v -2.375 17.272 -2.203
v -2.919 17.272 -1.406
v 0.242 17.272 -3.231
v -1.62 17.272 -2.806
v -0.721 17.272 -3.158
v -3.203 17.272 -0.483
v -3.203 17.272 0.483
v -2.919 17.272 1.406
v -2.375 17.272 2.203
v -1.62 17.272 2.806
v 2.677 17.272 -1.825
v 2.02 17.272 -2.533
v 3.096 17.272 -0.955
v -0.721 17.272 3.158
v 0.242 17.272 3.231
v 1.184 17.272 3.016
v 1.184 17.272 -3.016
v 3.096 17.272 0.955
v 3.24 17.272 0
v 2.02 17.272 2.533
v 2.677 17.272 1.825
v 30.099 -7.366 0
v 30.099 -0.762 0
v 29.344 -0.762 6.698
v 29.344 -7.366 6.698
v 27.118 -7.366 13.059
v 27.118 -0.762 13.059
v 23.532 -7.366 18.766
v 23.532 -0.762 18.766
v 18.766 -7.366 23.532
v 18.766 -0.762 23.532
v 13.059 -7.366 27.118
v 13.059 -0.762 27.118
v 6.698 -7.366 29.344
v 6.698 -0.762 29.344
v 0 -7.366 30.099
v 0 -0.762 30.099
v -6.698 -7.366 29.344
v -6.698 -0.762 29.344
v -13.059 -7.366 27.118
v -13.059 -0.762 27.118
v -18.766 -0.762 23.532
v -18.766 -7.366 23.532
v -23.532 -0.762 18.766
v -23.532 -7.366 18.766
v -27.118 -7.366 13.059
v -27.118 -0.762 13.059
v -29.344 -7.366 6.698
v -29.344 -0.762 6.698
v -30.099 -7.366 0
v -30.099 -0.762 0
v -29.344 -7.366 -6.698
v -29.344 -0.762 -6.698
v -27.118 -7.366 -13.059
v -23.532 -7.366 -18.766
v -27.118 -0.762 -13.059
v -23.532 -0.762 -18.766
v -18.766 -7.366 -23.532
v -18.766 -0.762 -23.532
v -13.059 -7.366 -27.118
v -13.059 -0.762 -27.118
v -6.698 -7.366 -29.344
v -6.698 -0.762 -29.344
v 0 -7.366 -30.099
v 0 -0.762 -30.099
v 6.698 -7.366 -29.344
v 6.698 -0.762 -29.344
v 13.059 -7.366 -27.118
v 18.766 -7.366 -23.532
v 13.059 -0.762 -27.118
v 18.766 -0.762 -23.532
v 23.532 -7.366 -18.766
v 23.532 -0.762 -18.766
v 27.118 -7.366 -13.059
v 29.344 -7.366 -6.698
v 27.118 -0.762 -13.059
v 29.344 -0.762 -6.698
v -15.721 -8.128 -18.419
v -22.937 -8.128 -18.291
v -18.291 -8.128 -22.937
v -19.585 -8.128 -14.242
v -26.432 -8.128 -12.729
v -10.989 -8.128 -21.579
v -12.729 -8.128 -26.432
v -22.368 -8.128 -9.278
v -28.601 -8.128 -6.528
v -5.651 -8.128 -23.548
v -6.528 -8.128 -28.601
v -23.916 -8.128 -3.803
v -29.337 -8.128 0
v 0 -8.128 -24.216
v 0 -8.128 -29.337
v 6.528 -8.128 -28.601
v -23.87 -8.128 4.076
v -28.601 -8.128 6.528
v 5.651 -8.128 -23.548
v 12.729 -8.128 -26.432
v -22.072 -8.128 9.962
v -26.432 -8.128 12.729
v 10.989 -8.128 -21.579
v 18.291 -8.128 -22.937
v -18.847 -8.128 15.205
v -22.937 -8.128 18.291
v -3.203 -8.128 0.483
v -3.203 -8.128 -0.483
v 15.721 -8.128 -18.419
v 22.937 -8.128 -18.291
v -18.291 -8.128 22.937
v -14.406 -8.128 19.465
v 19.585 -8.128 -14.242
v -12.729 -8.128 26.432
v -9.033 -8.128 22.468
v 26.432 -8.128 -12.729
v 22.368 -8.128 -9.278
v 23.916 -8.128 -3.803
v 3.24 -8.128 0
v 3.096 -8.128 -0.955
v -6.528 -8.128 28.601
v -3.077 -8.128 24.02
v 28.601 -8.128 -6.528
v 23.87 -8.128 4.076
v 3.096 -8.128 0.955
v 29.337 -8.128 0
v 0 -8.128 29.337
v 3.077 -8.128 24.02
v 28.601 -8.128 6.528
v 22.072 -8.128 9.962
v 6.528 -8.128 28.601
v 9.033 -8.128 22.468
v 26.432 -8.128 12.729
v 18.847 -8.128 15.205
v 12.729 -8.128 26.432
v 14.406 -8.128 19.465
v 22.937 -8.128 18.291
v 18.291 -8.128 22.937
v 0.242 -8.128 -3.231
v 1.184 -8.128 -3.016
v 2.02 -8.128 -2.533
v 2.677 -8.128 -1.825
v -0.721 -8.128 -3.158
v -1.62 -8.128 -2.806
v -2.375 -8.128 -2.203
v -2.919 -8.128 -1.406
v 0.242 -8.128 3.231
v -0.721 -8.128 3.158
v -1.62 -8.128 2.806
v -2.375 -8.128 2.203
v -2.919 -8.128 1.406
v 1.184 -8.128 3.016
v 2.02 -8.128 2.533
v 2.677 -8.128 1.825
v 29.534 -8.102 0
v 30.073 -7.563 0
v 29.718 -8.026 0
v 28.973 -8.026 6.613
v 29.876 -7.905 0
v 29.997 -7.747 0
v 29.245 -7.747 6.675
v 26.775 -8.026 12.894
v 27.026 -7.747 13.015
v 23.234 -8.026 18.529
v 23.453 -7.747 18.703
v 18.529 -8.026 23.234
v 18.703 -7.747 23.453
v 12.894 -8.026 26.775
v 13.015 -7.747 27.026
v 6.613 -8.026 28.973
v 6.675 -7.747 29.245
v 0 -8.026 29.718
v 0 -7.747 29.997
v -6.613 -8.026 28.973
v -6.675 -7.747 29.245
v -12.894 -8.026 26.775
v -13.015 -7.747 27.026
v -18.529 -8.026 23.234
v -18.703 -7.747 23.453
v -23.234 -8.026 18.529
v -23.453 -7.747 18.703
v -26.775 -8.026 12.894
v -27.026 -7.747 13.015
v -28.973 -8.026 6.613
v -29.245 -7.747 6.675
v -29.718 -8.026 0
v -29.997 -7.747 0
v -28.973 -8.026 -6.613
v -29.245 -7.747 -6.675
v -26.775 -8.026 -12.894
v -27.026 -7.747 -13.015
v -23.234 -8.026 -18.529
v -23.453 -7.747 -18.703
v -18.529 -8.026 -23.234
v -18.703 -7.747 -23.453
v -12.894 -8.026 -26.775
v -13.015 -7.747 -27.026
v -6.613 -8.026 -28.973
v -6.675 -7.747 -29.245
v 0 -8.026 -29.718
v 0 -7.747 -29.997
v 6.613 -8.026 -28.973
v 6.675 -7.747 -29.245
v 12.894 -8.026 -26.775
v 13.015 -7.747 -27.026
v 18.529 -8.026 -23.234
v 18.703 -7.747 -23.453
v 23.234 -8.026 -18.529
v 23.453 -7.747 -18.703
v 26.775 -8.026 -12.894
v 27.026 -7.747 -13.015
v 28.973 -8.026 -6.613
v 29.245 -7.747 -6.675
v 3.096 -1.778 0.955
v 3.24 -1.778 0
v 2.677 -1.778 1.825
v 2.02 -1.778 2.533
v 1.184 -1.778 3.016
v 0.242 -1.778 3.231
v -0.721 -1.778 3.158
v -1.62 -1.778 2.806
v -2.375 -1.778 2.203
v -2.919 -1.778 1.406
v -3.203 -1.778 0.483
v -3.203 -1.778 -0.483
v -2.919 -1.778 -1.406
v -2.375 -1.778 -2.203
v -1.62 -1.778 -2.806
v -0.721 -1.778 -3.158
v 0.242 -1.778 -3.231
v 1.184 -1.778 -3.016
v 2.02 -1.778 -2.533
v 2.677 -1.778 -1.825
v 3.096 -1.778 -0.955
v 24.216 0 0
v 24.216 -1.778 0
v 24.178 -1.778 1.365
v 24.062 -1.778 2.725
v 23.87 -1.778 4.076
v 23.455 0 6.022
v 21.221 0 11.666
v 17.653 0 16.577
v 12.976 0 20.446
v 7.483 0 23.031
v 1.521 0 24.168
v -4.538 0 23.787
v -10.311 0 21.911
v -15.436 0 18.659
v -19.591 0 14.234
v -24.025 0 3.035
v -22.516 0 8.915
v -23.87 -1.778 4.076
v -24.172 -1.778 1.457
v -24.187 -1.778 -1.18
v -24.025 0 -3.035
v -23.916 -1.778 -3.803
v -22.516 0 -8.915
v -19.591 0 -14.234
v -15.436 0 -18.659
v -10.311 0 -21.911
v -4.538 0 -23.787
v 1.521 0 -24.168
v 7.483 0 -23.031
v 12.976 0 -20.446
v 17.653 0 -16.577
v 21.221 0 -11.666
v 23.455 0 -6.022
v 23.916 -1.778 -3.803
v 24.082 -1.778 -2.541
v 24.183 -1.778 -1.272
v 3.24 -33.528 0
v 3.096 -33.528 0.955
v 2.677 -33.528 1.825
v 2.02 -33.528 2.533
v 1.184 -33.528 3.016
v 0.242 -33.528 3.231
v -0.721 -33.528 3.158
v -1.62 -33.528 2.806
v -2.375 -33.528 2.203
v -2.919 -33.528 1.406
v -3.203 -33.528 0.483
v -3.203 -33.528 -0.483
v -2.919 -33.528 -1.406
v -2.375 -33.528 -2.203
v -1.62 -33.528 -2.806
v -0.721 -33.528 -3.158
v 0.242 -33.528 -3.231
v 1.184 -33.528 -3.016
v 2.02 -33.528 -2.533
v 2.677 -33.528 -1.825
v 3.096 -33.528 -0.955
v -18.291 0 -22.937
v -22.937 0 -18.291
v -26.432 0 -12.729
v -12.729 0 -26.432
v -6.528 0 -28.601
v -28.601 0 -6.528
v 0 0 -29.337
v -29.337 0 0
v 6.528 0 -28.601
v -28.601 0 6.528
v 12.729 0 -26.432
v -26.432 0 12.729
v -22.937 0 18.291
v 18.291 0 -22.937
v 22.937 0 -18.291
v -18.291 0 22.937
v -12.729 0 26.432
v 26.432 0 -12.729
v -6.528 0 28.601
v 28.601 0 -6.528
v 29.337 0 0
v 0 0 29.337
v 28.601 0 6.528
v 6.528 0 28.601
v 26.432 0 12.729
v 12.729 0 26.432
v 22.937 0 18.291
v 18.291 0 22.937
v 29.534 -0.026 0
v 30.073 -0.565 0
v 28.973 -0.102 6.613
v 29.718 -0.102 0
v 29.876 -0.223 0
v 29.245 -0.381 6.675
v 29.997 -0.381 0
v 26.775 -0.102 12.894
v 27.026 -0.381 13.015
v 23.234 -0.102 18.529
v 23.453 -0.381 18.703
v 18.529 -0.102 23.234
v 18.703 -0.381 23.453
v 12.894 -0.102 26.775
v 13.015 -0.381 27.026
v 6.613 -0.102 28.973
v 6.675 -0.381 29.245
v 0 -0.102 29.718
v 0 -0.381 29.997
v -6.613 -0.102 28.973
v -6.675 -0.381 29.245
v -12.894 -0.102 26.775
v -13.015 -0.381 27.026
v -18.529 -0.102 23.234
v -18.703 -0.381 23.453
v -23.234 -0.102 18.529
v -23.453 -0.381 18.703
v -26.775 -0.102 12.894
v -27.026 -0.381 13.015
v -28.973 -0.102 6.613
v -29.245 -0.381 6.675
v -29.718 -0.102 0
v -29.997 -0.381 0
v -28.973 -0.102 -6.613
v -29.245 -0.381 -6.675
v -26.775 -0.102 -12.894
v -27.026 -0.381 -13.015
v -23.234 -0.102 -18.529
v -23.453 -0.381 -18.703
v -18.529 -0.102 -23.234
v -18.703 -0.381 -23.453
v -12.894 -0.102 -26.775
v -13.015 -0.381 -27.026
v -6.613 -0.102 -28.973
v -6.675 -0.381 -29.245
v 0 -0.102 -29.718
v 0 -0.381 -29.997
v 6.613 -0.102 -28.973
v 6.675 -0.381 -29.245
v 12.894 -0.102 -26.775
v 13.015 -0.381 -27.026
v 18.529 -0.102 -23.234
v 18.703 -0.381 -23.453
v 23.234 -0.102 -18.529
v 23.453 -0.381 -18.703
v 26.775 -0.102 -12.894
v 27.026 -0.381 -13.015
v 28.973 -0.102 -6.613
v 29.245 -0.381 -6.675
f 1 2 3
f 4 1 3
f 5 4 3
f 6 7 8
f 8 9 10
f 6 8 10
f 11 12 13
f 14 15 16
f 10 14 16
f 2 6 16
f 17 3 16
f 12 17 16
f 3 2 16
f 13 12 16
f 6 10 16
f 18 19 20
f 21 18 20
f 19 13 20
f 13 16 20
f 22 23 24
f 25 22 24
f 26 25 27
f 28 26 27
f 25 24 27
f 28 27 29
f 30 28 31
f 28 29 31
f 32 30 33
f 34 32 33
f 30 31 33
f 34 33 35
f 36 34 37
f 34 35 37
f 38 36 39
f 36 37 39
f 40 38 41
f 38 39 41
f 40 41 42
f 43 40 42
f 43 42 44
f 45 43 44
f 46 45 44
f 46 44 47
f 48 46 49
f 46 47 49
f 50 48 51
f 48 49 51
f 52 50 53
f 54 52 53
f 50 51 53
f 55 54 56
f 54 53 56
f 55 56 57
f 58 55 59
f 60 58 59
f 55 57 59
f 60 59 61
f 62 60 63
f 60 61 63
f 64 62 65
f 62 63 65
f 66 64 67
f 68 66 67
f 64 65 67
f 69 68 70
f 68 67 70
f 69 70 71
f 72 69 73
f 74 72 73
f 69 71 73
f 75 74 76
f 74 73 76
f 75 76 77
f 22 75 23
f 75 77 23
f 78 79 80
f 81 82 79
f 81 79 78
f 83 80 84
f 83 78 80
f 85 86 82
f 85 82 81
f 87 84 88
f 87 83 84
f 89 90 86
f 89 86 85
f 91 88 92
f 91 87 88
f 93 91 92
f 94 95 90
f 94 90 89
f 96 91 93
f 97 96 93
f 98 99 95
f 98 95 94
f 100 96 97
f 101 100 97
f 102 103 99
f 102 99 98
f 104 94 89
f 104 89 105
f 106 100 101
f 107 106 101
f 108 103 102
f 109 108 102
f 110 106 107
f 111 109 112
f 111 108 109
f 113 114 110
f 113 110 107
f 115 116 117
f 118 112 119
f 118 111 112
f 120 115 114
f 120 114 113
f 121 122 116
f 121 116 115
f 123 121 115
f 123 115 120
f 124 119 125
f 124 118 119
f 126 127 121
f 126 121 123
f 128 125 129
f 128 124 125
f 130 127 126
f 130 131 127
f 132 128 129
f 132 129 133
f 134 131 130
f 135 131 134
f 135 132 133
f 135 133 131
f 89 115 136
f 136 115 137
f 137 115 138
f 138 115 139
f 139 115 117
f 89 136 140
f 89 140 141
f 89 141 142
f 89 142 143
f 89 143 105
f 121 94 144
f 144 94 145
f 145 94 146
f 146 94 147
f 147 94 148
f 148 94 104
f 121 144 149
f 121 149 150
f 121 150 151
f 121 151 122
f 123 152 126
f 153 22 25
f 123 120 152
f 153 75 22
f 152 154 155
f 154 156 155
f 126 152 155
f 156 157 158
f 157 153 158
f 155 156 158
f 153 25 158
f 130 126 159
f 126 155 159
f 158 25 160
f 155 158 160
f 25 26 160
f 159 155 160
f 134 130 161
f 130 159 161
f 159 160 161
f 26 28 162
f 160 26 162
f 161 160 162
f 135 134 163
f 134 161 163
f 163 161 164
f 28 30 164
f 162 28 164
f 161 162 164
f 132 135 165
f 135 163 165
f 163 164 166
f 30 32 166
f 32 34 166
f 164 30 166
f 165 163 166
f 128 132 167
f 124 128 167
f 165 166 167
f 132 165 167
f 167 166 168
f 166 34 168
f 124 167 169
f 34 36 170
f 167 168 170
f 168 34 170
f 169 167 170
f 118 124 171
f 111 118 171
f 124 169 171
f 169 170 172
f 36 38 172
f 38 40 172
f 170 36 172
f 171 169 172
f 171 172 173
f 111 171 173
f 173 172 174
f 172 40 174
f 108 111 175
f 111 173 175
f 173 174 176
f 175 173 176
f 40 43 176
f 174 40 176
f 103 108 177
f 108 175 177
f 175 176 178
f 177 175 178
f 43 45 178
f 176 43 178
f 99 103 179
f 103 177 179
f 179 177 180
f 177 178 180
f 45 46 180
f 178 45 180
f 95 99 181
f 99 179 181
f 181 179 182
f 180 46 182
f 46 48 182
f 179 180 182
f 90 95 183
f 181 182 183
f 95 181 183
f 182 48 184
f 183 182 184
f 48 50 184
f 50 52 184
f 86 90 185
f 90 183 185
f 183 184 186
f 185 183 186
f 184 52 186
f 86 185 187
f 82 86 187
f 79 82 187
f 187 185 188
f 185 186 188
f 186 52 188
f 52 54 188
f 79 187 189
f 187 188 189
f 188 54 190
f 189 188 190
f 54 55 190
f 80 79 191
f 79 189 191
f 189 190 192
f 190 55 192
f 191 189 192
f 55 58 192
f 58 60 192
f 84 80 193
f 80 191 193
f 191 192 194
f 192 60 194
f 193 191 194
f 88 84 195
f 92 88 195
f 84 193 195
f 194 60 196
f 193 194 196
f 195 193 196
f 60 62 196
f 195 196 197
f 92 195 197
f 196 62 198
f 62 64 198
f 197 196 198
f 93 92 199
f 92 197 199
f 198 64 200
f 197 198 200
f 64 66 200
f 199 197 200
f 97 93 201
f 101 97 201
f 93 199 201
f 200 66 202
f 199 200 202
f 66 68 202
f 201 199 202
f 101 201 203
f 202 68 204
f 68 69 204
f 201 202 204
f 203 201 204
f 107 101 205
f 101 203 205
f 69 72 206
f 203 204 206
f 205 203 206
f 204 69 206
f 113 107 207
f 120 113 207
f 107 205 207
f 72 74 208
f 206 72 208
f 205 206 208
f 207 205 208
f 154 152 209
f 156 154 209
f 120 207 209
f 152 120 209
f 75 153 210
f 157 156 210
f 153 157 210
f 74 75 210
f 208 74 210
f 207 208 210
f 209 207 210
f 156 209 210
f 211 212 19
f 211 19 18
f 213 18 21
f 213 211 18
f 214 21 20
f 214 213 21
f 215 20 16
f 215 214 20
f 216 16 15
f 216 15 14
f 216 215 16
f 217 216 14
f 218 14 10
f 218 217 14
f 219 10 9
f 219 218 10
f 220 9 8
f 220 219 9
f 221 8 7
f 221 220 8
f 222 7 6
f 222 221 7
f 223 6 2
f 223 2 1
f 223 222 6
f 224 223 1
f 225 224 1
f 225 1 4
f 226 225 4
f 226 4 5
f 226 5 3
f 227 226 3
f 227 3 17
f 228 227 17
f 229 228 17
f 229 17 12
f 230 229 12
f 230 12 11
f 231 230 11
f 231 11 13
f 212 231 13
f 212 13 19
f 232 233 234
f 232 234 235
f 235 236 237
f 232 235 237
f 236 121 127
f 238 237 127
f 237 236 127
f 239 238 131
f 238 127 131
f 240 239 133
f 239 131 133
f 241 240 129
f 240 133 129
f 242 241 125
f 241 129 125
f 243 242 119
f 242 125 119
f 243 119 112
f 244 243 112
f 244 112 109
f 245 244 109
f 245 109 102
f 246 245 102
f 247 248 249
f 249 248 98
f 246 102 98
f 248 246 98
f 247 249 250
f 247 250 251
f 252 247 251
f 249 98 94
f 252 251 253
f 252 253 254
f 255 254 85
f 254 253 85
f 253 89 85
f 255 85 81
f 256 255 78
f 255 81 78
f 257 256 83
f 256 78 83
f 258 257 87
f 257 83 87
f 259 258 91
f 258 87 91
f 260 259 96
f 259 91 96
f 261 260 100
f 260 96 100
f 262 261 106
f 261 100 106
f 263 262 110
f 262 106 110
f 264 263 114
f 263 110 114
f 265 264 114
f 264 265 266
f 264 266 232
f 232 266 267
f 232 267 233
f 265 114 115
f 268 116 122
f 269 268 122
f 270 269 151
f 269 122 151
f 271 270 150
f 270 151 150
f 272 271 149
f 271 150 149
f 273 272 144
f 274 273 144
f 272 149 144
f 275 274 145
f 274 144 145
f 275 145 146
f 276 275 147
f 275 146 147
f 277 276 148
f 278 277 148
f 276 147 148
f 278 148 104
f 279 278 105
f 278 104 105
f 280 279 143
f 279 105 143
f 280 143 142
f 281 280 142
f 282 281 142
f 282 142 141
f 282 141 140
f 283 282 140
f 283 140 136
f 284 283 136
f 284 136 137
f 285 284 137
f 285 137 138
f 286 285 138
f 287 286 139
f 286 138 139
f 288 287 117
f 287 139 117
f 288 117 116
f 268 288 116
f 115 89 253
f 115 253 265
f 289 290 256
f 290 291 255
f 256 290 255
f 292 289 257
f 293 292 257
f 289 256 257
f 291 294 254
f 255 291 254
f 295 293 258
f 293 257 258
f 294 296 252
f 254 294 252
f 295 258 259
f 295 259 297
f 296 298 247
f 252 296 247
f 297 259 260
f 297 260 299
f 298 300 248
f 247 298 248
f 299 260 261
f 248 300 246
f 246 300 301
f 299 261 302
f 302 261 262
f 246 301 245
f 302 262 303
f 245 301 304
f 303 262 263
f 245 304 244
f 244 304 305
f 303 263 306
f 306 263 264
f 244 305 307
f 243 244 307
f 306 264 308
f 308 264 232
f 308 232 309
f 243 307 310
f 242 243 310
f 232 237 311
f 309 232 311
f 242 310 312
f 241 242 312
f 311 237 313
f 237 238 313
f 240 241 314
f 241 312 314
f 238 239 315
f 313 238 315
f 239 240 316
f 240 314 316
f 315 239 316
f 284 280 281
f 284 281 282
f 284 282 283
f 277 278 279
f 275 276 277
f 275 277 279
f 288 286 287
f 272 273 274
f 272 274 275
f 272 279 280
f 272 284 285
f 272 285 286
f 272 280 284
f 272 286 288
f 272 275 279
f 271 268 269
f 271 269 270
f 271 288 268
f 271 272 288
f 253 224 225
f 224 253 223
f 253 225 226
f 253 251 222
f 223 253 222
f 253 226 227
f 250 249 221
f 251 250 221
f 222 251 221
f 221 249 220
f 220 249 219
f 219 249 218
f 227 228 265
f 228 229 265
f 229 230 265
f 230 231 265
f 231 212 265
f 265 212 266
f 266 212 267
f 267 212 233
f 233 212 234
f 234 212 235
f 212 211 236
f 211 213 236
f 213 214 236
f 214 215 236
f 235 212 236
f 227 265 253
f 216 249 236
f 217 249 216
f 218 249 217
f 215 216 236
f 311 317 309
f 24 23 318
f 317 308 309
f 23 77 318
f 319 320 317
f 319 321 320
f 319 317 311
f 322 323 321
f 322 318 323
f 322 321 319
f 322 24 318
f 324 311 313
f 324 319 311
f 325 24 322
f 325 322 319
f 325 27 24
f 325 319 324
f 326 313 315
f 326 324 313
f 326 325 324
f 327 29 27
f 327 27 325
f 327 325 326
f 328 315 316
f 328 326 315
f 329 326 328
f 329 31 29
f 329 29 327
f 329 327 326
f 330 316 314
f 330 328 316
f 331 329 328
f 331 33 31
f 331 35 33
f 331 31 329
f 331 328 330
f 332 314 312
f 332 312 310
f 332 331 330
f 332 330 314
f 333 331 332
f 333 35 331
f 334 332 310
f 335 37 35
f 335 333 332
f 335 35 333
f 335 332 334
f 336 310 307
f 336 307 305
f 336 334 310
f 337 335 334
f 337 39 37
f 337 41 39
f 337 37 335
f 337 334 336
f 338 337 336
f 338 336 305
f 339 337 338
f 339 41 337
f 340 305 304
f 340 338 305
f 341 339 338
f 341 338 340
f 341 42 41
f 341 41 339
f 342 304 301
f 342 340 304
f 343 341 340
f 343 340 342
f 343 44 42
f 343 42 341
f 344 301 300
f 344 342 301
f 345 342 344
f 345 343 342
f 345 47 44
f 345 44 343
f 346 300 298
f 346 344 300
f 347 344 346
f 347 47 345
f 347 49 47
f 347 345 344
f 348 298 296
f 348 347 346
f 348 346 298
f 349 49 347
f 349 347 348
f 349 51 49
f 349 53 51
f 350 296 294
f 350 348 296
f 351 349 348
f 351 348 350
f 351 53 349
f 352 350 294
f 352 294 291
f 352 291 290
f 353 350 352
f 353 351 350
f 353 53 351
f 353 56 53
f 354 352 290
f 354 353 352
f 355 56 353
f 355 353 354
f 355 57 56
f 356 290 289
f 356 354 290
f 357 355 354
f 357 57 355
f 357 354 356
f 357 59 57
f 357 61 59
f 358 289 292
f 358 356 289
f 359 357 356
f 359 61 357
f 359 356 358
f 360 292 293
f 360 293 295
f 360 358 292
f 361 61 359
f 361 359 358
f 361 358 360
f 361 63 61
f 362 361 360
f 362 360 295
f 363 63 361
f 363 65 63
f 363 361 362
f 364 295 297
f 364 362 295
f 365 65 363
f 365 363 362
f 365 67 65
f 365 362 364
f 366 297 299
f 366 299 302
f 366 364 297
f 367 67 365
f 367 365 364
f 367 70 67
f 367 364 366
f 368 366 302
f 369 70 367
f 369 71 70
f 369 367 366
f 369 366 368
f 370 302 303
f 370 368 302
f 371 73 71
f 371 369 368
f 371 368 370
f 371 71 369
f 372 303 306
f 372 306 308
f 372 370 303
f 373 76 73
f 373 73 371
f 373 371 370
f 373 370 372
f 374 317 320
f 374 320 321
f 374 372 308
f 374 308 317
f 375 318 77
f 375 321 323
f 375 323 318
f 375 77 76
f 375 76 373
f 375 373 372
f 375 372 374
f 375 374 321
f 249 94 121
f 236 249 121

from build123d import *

# Parameters (mm, degrees)
F0_R     = 30.099
F1_DEPTH = 8.128
F2_R     = 24.216053
F3_DEPTH = 25.4
F4_W     = 54.685762
F4_H     = 7.879252
F5_DEPTH = 6.35
F6_R     = 3.239592
F7_DEPTH = 25.4
F8_DEPTH = 25.4
F9_R     = 0.762


with BuildPart() as f1:
    # F0 (on Front) → F1 (new body)
    with BuildSketch(Plane.XZ):
        Circle(F0_R)
    extrude(amount=F1_DEPTH)

    # F2 (on face) → F3 (cut)
    with BuildSketch(Plane.XZ.offset(8.128)):
        Circle(F2_R)
    extrude(amount=-F3_DEPTH, mode=Mode.SUBTRACT)

    # F4 (on face) → F5 (join)
    with BuildSketch(Plane.XZ.offset(8.128)):
        with Locations((-1.039022, 0.136772)):
            Rectangle(F4_W, F4_H)
    extrude(amount=-F5_DEPTH)

    # F6 (on face) → F7 (join)
    with BuildSketch(Plane.XZ.offset(8.128)):
        Circle(F6_R)
    extrude(amount=F7_DEPTH)

    # F6 (on face) → F8 (join)
    with BuildSketch(Plane.XZ.offset(8.128)):
        Circle(F6_R)
    extrude(amount=-F8_DEPTH)

    # F9
    f9_edges = [f1.edges().sort_by_distance(p)[0] for p in [
        (-30.099, 0, 0),
        (-30.099, -8.128, 0),
    ]]
    fillet(f9_edges, radius=F9_R)


solid = f1.part
